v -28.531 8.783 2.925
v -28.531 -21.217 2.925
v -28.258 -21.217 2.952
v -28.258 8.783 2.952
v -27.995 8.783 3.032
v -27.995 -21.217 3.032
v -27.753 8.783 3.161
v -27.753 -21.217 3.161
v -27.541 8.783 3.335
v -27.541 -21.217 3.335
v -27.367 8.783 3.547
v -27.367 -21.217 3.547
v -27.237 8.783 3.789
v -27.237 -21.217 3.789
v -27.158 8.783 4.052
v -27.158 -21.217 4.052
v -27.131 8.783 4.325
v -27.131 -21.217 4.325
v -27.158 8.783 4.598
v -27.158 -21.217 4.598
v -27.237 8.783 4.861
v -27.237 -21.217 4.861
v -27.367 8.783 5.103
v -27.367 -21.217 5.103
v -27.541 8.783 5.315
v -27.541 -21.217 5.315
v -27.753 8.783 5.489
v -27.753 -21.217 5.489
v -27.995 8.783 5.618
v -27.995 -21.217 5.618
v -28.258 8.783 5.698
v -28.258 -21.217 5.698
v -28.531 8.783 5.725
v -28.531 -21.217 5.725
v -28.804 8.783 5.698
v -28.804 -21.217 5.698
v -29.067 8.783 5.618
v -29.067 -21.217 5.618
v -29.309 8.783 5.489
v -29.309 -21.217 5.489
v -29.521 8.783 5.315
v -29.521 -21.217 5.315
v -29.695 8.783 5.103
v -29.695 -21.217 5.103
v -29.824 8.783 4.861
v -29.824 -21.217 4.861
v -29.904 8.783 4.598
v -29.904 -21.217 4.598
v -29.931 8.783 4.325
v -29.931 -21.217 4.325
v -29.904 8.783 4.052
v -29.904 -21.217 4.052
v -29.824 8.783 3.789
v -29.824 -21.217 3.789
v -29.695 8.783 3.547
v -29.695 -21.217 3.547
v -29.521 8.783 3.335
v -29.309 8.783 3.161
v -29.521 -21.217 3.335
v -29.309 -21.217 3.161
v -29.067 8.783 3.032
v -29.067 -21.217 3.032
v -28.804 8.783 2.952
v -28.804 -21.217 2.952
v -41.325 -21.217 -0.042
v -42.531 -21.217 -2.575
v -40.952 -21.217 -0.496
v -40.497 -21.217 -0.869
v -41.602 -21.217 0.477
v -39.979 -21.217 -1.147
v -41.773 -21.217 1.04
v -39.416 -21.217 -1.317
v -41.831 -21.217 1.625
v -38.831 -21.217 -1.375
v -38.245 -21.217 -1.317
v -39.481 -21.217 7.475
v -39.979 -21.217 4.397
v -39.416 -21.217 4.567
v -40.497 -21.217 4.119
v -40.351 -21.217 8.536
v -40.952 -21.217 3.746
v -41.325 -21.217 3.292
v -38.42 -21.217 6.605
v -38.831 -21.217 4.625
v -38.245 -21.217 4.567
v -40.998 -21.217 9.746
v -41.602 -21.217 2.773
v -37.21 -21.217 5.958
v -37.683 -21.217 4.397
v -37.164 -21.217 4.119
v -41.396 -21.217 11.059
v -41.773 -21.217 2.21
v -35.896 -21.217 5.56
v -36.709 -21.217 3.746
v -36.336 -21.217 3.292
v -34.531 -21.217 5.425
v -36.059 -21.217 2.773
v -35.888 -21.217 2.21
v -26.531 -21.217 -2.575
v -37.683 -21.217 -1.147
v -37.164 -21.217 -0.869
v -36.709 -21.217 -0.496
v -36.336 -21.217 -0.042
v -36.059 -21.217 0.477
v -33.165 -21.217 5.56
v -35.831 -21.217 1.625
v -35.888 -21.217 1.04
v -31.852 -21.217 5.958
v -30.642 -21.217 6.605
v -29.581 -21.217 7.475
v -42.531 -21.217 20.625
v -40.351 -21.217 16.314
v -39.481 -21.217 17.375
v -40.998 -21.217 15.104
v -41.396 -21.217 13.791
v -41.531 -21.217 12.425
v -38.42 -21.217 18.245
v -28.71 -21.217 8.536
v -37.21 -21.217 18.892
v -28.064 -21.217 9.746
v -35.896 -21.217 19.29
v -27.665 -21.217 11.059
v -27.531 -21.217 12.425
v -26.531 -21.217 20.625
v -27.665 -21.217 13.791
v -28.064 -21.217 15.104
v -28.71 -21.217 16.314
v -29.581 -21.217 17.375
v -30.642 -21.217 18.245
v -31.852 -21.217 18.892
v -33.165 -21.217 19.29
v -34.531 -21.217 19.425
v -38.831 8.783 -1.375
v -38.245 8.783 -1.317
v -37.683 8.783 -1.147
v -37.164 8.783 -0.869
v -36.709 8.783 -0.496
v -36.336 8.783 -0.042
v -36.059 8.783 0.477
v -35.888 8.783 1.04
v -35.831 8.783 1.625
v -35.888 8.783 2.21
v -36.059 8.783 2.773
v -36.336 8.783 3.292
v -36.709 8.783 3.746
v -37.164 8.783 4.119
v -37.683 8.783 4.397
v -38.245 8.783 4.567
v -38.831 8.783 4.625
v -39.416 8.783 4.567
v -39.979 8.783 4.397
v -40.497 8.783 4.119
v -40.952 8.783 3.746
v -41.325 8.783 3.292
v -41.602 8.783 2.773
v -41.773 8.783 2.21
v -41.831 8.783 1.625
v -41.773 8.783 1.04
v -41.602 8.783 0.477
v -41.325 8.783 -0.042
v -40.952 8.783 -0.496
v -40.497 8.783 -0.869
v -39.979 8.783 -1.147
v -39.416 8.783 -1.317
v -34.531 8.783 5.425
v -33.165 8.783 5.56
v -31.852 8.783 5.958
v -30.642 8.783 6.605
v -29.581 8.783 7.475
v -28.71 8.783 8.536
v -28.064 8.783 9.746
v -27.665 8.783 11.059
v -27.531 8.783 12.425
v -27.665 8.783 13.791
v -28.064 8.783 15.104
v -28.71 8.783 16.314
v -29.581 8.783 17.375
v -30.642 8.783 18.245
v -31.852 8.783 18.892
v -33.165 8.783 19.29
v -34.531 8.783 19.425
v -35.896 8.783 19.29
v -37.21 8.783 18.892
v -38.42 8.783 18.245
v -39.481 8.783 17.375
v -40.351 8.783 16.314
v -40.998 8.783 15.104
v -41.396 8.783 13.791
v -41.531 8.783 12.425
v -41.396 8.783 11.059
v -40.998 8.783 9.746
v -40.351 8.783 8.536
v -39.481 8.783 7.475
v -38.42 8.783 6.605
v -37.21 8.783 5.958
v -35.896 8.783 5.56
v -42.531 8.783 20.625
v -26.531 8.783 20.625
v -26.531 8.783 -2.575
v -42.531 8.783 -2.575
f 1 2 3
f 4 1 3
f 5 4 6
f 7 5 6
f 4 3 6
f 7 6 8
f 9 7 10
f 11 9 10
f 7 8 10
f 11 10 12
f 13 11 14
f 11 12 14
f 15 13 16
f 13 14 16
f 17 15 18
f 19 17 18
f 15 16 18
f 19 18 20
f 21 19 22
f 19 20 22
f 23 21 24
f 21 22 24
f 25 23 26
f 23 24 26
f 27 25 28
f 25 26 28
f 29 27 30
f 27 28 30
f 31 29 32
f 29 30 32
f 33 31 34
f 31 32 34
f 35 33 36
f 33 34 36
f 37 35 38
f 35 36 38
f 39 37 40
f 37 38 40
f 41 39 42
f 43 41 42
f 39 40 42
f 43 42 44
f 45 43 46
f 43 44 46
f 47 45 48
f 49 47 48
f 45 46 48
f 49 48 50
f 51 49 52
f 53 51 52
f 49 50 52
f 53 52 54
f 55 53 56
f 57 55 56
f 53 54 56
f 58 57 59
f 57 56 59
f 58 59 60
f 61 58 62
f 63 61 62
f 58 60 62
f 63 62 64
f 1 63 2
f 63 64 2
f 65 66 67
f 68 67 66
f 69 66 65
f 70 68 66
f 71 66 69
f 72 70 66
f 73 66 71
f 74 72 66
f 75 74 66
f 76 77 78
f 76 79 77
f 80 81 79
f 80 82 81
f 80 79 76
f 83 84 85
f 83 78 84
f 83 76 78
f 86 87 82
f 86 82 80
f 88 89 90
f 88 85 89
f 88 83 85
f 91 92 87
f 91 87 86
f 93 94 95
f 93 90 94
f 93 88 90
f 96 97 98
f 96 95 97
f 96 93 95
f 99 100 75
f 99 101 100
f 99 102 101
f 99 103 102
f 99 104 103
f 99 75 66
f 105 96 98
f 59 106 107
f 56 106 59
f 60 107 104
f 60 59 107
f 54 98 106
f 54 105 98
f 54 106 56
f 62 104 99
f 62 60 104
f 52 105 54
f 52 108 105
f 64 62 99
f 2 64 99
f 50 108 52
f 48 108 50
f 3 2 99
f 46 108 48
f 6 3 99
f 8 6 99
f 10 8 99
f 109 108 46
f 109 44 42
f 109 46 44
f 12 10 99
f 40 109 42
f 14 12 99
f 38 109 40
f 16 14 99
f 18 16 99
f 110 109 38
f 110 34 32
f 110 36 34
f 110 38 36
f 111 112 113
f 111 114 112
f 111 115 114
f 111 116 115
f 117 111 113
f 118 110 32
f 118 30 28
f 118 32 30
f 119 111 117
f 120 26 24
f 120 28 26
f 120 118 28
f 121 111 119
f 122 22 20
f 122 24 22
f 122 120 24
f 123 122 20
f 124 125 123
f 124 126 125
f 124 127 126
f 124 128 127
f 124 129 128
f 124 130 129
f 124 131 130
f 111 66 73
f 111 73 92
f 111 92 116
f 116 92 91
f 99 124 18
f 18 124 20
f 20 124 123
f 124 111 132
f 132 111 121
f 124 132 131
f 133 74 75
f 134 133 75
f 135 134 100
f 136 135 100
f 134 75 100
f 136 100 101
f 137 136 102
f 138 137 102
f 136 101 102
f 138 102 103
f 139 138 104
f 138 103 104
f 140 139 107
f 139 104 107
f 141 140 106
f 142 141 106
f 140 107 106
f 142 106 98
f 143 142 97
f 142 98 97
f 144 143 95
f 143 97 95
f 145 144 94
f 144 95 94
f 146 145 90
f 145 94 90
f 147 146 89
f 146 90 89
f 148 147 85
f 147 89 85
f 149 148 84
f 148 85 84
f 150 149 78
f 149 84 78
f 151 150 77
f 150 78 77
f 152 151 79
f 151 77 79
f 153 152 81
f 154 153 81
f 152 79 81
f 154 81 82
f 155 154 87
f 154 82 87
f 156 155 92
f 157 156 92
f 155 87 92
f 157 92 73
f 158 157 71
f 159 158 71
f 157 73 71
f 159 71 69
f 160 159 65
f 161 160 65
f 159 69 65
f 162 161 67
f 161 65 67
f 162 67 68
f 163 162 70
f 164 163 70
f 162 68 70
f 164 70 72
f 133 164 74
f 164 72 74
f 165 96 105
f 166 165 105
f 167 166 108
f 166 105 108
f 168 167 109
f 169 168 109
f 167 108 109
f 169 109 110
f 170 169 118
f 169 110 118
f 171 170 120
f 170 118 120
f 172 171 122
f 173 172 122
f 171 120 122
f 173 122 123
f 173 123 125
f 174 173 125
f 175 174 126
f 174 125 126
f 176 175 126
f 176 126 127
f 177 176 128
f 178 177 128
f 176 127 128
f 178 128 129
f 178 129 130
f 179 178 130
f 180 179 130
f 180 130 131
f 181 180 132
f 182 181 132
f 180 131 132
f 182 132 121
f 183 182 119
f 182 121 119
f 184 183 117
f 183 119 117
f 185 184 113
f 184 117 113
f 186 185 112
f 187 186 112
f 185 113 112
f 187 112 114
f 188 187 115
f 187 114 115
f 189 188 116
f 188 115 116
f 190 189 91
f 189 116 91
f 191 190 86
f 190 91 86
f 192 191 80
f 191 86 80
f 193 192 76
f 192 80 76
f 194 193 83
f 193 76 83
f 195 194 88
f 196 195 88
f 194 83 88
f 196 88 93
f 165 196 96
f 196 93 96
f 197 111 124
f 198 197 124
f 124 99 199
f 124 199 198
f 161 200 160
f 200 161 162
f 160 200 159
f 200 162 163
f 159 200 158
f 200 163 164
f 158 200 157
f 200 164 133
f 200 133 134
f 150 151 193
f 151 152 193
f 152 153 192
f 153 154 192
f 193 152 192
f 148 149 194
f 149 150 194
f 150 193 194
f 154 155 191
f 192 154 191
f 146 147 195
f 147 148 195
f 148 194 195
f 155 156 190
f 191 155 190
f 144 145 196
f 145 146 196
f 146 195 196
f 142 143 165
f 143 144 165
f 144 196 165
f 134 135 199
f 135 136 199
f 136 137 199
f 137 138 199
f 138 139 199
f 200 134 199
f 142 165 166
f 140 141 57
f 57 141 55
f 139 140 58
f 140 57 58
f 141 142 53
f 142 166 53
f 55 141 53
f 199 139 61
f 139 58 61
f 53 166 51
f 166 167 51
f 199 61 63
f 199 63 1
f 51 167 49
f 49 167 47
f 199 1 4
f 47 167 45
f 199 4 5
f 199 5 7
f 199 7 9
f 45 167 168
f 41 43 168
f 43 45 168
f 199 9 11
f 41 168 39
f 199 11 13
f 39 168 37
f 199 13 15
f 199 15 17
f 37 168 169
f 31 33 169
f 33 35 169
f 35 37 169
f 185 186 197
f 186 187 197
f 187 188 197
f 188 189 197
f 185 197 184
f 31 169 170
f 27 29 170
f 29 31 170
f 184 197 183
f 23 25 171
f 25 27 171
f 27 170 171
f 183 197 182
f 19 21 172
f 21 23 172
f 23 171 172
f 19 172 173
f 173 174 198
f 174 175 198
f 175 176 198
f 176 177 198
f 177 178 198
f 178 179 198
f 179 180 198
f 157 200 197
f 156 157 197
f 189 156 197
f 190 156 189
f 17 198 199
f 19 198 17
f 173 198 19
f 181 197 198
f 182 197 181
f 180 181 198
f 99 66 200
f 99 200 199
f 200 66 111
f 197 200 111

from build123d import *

# Parameters (mm, degrees)
CROQUIS1_W              = 16
CROQUIS1_H              = 23.2
CROQUIS1_R              = 7
CROQUIS1_R_2            = 3
CROQUIS1_R_3            = 1.4
SALIENTE_EXTRUIR1_DEPTH = 30


with BuildPart() as part:
    # Croquis1 → Saliente-Extruir1 (new body)
    with BuildSketch(Plane.XZ.offset(21.216878831)):
        with Locations((-34.53076768, 9.025)):
            Rectangle(CROQUIS1_W, CROQUIS1_H)
        with Locations((-34.53076768, 12.425)):
            Circle(CROQUIS1_R, mode=Mode.SUBTRACT)
        with Locations((-38.83076768, 1.625)):
            Circle(CROQUIS1_R_2, mode=Mode.SUBTRACT)
        with Locations((-28.53076768, 4.325)):
            Circle(CROQUIS1_R_3, mode=Mode.SUBTRACT)
    extrude(amount=-SALIENTE_EXTRUIR1_DEPTH)


solid = part.part
